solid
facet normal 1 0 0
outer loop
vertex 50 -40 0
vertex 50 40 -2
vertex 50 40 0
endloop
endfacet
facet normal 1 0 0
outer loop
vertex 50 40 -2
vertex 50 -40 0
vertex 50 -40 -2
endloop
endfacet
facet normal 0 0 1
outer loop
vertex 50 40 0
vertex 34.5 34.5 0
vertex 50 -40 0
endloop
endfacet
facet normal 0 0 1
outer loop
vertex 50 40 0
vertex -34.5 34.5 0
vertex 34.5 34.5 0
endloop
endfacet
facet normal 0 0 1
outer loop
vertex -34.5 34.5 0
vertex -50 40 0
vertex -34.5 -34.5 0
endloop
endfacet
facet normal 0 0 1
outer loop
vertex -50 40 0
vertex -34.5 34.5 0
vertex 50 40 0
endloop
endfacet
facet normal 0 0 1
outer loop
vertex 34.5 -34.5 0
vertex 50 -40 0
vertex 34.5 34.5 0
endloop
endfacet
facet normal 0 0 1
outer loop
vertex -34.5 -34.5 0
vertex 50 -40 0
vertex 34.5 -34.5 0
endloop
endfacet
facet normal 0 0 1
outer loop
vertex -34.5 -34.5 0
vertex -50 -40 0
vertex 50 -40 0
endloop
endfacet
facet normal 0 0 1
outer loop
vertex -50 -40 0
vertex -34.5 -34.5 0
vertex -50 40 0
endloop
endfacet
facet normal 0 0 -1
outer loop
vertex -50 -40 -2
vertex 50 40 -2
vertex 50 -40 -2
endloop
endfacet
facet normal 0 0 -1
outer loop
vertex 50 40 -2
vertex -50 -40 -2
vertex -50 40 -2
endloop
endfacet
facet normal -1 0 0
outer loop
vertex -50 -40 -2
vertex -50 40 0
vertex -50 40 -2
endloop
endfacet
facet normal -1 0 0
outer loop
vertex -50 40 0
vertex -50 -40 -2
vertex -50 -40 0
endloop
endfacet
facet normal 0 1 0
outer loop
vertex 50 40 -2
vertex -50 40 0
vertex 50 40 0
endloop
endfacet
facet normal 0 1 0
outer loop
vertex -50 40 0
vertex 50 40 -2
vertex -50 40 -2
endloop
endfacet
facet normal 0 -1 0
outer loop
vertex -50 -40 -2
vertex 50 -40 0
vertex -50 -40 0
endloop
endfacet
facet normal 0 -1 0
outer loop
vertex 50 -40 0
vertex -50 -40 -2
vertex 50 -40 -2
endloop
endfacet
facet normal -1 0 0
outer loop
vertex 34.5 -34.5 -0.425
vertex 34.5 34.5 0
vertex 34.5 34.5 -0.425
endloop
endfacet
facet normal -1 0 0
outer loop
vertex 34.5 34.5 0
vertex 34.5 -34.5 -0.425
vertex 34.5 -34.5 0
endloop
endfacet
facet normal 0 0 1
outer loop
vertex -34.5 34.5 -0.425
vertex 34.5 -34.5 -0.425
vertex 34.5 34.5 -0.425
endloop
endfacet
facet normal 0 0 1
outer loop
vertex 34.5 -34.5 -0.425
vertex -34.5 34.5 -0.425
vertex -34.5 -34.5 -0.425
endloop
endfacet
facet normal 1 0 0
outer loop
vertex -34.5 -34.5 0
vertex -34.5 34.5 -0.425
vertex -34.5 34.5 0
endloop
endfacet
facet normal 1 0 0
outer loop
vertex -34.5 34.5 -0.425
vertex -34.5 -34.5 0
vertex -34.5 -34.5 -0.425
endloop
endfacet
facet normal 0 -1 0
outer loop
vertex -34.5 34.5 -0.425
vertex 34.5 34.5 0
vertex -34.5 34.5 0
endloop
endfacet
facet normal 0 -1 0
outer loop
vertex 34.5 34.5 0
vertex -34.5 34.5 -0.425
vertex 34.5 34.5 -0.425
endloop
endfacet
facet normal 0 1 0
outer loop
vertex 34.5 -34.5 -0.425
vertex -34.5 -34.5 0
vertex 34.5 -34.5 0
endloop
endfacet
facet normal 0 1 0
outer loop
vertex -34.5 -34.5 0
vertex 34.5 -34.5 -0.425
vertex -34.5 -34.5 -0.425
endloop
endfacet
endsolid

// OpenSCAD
// для проектирования корпуса мне не нужна прорисованная 3д модель кнопок и прочего, мне нужны координаты и размеры отверстий для кнопок.
//  найденные мной 3д модели слишком тяжелые для обработки

// Нужно ли понижуние под клавиатуру, чтоб она туда утопала или достаточно просто наклеить сверху. Такое понижение усложняет печать, так как лицевая сторона должна прилегать к печатному столу  3д принтера. А если перевернуть модель при печати, то вся внутренняя полость будет занята поддержками, задолбаюсь их удалять.


//размеры лицевой панели зависят от содержания


//пленочная клавиатура вклеивается в понижение на корпусе, шлейф через отверстие проводится внутрь.
KeyPad_Vert_size = 77; // высота клавиатуры
KeyPad_Horz_size = 69; // ширина клавиатуры
KeyPad_Z_size = 0.85;  // толщина клавиатуры
// не смог найти или измерить радиусы скругления углов клавиатуры, по этому будет квадратное отверстие под клавиатуру
KeyPad_Wire_size = 22; // ширина отверстия для шлейфа от клавы к ардуино

//Энкодеры крепятся в отверстия и фиксируются гайками. Большие и малые энкодеры не отличаются по способу крепления к корпусу.
Encoder_Hole_size_diam = 5;

//Отдельные клавиши припаиваются сначала к печатной плате, потом плата ставится на стойки внутри корпуса и фиксируется винтами. Кнопки должны торчать наружу креплениями шляпок через отверстия в корпусе. На эти крепления с наружней стороны устанавливаются шляпки кнопок.    Важно не ошибиться с высотой стоек, чтобы в отпущенном положении сама кнопка не упиралась в корпус, а в нажатом полодении хватало расстояния дляшляпки, чтоб прожать кнопку и не упереться в корпус снаружи.



difference()
{
translate([-50,-40,-2]) cube([100, 80,2]); 
cube([KeyPad_Horz_size,KeyPad_Horz_size,KeyPad_Z_size],center=true);
}
